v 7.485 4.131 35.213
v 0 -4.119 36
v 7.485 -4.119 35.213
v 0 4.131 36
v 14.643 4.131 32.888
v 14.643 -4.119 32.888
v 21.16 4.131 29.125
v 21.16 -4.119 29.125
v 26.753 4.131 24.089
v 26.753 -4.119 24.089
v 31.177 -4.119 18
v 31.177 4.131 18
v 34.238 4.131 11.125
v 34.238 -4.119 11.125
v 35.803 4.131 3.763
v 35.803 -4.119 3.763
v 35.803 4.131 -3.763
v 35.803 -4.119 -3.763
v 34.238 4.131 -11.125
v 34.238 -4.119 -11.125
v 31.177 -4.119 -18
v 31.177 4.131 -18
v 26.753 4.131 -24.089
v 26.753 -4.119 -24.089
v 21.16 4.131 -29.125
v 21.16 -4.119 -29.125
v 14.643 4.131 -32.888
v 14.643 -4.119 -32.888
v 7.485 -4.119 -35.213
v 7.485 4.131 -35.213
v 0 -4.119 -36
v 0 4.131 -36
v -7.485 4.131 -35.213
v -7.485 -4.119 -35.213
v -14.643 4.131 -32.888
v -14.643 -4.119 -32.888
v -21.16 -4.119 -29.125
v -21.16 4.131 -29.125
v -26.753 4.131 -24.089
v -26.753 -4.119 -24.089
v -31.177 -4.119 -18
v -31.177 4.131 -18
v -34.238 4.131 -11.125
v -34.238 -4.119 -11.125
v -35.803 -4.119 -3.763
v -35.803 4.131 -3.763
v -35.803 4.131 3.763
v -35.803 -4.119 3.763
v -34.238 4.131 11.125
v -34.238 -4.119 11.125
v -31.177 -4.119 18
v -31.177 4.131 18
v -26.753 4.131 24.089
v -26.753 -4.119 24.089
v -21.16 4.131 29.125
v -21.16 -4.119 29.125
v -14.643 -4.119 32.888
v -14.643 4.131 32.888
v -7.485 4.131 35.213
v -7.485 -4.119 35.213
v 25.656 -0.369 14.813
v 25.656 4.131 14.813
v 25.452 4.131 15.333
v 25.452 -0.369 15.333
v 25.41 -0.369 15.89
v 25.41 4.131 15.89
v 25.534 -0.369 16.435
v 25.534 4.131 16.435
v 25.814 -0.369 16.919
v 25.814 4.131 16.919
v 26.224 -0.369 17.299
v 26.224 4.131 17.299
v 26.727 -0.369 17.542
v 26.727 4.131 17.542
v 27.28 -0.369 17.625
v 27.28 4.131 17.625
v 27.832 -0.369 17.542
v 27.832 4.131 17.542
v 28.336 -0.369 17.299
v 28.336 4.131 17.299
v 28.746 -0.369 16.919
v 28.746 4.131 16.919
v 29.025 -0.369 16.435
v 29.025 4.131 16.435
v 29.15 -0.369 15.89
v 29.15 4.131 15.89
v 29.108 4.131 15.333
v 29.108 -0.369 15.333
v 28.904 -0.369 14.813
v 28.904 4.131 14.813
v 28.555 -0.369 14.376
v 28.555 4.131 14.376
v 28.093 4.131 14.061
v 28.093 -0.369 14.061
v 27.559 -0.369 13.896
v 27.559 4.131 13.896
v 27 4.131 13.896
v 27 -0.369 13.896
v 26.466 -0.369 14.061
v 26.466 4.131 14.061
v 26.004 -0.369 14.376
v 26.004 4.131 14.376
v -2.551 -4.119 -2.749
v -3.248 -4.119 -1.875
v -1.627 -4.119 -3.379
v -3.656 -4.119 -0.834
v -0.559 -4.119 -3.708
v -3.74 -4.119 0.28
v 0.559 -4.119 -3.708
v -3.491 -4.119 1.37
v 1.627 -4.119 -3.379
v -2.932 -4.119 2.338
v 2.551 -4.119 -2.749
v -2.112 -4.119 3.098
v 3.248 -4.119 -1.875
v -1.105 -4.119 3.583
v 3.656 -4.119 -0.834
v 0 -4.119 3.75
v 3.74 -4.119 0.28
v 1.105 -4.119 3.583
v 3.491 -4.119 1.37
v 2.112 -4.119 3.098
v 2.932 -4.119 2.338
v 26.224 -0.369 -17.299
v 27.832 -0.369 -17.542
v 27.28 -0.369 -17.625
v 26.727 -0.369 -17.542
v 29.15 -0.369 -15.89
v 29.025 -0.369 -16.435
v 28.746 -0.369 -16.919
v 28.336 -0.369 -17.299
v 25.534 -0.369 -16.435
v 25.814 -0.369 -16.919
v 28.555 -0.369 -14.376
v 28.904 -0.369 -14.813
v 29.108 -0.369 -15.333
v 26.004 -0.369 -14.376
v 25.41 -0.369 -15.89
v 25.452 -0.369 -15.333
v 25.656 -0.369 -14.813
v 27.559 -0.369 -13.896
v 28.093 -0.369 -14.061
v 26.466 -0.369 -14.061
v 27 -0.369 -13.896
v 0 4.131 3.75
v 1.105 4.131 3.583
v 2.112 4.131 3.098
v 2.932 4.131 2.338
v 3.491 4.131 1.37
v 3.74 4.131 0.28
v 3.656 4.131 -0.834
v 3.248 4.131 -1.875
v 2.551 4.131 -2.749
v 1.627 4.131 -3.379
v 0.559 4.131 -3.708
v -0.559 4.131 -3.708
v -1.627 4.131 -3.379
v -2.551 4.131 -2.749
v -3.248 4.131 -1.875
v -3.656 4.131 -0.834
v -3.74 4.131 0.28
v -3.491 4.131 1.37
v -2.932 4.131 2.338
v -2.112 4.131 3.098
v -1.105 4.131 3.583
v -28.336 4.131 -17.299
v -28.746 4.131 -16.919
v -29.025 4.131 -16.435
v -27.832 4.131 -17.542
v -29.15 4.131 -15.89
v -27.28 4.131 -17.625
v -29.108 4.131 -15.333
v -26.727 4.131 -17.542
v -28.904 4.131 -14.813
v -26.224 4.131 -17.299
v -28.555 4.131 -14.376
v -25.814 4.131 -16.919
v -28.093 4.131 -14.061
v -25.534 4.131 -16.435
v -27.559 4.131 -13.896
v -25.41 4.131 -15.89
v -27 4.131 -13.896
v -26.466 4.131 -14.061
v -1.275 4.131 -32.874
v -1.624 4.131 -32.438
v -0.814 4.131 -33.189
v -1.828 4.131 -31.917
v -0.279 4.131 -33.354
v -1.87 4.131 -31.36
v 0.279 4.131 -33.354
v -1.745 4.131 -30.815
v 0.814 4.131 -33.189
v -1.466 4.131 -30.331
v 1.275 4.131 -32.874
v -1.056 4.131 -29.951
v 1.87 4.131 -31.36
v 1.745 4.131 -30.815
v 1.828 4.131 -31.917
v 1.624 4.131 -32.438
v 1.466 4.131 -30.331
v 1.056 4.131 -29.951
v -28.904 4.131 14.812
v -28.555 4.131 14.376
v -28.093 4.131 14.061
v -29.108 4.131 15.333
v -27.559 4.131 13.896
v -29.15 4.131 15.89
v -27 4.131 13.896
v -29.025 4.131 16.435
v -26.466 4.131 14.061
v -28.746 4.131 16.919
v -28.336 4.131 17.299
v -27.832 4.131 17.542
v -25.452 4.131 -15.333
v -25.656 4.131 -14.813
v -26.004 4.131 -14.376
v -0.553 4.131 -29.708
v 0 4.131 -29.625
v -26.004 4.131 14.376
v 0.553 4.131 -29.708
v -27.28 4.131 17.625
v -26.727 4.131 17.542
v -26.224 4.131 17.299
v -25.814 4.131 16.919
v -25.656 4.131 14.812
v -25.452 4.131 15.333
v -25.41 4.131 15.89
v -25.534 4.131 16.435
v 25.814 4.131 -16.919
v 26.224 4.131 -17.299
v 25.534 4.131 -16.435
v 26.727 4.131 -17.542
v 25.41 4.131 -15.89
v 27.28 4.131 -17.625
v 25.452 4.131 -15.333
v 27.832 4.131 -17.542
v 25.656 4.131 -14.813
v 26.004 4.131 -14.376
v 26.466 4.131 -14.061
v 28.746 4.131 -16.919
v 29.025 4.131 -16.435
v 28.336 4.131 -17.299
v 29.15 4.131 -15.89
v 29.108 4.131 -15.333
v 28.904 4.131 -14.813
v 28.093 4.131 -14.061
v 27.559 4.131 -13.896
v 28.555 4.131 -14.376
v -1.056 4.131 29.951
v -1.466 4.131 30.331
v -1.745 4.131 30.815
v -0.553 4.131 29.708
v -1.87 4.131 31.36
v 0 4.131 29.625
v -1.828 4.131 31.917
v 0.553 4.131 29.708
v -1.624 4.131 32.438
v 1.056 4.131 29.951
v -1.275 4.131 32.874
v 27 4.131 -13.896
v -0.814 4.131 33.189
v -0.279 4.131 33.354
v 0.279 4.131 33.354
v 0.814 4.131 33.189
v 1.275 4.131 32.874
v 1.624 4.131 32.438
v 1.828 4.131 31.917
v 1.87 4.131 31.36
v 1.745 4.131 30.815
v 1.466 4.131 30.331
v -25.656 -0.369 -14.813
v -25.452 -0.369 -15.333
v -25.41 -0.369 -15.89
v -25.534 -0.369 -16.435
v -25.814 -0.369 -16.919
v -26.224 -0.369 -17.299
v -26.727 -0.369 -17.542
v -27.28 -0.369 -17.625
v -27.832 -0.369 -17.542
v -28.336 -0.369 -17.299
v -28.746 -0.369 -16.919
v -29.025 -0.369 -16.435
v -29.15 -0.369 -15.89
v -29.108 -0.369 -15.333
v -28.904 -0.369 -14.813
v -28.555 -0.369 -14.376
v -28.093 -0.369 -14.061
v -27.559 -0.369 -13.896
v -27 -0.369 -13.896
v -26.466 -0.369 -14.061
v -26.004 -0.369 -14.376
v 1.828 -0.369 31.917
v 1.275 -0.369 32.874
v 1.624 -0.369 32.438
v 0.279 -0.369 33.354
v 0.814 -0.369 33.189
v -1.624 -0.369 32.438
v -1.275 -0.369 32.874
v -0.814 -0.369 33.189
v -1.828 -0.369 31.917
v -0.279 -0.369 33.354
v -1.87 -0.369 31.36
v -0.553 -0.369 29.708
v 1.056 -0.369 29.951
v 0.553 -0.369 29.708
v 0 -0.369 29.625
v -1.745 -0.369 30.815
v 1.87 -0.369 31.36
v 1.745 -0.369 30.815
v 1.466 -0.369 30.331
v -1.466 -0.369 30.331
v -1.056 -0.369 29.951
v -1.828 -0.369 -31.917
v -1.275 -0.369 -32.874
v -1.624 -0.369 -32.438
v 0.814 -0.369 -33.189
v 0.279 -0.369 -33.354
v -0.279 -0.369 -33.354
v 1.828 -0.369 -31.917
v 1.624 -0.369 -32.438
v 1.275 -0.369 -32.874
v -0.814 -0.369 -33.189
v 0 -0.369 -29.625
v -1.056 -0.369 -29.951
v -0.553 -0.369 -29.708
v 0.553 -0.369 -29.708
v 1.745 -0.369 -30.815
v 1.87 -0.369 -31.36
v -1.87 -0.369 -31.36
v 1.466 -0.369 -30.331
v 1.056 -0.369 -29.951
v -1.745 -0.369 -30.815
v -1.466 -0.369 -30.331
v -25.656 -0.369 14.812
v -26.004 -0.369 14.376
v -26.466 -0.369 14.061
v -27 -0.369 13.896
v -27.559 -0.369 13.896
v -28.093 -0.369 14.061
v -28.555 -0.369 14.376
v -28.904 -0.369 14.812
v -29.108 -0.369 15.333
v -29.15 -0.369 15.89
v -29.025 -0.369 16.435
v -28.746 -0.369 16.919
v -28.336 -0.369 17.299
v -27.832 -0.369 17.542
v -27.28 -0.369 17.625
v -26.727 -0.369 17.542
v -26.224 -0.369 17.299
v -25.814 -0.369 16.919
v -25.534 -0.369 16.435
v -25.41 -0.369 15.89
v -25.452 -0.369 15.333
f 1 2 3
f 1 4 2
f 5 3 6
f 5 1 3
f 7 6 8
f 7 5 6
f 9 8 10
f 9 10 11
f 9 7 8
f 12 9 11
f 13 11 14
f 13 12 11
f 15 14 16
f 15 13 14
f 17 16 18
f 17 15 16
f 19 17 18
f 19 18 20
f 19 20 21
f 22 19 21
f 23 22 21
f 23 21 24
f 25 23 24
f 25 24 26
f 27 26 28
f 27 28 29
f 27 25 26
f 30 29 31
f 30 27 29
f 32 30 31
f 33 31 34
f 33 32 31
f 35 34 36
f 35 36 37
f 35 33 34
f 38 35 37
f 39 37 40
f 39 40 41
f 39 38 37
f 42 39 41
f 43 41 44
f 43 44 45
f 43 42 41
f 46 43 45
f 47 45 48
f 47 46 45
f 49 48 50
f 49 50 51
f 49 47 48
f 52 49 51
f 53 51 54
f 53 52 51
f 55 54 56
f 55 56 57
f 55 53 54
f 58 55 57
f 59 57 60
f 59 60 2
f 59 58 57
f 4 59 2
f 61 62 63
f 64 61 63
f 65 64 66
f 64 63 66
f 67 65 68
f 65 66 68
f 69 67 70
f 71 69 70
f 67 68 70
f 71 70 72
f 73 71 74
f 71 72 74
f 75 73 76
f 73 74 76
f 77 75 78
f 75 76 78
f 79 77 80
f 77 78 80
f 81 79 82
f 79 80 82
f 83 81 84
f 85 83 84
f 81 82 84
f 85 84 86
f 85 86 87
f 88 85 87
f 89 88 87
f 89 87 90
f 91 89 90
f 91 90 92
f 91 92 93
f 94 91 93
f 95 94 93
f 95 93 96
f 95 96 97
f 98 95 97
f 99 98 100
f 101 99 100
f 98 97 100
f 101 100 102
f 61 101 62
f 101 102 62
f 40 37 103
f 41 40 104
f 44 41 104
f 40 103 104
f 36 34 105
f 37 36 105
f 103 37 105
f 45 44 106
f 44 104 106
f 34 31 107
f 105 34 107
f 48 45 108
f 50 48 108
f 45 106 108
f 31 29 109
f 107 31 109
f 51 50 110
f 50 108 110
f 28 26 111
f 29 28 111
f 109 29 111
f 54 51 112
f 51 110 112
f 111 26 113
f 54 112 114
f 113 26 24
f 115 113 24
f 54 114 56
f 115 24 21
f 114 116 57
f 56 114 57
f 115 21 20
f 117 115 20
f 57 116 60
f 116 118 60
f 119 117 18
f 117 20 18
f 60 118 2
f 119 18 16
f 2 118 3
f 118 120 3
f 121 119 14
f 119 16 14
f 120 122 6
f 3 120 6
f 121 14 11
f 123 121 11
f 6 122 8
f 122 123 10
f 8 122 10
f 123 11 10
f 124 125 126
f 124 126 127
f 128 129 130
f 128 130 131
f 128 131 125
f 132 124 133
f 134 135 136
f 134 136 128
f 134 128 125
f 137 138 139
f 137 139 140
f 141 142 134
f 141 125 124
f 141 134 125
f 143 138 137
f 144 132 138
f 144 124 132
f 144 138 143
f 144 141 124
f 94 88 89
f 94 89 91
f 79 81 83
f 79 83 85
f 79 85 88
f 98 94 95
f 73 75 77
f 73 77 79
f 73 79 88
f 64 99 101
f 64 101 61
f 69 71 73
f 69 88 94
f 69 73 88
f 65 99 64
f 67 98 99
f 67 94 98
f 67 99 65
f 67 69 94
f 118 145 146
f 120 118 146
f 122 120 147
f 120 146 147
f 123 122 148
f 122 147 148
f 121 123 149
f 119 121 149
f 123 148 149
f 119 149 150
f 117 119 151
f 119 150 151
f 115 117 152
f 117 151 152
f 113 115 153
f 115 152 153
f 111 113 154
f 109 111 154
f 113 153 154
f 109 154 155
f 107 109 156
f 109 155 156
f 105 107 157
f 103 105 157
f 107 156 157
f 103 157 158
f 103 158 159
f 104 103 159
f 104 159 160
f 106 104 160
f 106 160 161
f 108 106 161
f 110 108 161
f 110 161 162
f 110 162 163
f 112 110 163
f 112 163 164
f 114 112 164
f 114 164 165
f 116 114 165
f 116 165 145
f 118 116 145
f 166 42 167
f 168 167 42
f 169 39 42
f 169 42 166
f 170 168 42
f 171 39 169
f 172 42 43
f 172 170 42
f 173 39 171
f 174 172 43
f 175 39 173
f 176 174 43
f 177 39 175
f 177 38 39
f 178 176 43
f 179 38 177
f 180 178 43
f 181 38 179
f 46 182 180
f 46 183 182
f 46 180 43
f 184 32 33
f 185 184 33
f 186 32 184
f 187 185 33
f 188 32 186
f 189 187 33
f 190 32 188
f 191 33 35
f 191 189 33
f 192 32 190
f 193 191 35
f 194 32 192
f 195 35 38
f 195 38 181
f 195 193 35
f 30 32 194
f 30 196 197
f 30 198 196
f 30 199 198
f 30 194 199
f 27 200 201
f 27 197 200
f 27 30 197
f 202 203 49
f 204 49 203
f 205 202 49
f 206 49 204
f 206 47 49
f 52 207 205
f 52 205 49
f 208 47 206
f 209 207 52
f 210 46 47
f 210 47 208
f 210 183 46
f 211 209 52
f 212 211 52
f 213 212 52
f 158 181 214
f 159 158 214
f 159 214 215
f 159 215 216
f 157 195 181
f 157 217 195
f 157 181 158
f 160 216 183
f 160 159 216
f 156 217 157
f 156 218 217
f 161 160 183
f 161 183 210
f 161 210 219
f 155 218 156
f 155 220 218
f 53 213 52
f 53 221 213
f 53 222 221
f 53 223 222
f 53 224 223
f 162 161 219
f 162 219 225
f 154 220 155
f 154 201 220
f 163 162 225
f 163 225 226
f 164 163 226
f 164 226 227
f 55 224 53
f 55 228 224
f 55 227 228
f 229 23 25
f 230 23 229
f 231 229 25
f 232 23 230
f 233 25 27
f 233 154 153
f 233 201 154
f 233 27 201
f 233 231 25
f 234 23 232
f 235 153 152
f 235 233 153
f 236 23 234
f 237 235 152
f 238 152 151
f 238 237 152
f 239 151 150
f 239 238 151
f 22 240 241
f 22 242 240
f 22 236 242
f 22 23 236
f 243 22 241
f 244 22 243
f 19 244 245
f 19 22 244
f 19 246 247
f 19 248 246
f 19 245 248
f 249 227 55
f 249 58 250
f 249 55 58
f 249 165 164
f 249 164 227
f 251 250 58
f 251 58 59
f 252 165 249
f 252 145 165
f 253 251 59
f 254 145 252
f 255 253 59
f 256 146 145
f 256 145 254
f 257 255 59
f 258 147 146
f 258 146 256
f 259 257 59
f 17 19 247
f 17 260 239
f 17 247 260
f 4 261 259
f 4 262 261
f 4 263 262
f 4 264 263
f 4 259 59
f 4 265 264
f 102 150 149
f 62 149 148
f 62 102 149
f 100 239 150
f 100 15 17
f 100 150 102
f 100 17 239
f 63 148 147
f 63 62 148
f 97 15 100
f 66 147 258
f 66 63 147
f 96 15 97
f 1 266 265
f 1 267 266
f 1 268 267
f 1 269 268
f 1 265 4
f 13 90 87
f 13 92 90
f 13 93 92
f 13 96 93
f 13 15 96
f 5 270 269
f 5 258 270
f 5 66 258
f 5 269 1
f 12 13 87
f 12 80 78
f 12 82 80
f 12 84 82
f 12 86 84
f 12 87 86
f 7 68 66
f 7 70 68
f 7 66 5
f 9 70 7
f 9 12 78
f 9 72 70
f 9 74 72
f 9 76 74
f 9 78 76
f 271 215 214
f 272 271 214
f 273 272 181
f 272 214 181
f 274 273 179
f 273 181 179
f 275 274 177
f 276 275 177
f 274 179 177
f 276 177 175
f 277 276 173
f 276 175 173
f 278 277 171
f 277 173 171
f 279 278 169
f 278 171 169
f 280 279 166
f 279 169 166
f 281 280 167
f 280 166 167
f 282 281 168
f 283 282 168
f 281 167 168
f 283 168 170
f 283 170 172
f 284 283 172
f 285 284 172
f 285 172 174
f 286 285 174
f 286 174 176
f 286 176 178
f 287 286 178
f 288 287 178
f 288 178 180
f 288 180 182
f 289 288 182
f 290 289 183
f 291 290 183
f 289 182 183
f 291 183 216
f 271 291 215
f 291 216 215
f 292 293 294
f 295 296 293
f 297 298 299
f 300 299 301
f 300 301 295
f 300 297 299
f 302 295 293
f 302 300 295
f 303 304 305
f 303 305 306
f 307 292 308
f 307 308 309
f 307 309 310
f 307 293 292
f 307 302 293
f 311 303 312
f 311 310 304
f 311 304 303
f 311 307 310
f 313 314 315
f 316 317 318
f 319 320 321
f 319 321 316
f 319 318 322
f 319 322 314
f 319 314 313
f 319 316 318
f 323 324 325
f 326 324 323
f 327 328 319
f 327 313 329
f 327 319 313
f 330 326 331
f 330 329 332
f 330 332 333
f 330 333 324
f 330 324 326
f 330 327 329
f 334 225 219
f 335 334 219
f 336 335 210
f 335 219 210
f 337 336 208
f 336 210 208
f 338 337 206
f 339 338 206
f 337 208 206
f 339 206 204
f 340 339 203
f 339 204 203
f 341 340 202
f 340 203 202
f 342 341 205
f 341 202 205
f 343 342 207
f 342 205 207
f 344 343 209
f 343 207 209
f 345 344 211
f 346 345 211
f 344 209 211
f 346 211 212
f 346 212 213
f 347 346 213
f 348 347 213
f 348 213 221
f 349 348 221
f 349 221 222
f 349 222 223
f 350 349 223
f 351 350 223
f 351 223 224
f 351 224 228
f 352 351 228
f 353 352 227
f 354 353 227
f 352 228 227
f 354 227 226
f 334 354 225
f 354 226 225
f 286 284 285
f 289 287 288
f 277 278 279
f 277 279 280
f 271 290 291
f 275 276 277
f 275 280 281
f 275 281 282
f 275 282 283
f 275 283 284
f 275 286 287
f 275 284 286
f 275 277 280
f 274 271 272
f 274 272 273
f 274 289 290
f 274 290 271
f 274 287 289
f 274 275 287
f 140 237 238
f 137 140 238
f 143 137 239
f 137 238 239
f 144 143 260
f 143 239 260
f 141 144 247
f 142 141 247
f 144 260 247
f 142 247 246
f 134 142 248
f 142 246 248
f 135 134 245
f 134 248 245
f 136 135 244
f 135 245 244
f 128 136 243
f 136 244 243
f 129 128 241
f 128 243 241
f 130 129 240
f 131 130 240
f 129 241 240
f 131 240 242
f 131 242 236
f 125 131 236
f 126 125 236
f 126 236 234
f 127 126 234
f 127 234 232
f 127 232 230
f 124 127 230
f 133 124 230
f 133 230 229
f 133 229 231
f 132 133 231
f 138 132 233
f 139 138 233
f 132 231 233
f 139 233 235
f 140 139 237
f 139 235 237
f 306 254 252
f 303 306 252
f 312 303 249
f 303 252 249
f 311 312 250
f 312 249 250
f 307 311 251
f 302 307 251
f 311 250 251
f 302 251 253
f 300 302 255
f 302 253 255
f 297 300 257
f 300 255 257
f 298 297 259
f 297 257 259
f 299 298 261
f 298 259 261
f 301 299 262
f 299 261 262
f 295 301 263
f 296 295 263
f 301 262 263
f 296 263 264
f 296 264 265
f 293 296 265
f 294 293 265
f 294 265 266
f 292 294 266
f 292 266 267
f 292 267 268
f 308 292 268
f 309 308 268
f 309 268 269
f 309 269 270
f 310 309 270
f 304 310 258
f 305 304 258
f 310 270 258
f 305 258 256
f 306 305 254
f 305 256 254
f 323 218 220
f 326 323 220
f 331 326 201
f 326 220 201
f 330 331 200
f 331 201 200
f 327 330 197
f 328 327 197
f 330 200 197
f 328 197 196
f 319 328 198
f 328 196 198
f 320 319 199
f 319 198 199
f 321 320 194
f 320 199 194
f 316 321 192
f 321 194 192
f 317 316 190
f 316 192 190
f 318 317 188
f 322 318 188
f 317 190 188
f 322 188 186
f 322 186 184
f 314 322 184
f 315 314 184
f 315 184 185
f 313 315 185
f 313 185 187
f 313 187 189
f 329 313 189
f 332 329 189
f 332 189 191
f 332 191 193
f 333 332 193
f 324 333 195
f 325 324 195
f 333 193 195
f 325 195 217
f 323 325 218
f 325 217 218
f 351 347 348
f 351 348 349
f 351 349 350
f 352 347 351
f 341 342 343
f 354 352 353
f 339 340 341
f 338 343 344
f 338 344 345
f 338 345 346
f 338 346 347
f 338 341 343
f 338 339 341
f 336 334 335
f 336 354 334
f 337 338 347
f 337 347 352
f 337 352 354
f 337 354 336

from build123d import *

# Parameters (mm, degrees)
SKETCH_1_R               = 24
EXTRUDE_1_DEPTH          = 2.75
SKETCH_4_R               = 2.5
CUT_EXTRUDE_1_DEPTH      = 22
SKETCH_6_R               = 1.25
CUT_EXTRUDE_3_DEPTH      = 3
PATTERN_CIRCULAR_1_COUNT = 6
SCALE_1_SCALE            = 1.5


with BuildPart() as part:
    # 草图1 → 凸台-拉伸1 (new, symmetric)
    with BuildSketch(Plane(origin=(0, 0, 0), x_dir=(1, 0, 0), z_dir=(0, 1, 0))):
        with Locations(Location((0, 0, 0), (0, 0, 270))):
            Circle(SKETCH_1_R)
    extrude(amount=EXTRUDE_1_DEPTH, both=True)

    # 草图4 → 切除-拉伸1 (cut)
    with BuildSketch(Plane(origin=(0, 2.75, 0), x_dir=(1, 0, 0), z_dir=(0, 1, 0))):
        with Locations(Location((0, 0, 0), (0, 0, 270))):
            Circle(SKETCH_4_R)
    extrude(amount=-CUT_EXTRUDE_1_DEPTH, mode=Mode.SUBTRACT)

    # 草图6 → 切除-拉伸3 (cut)
    with BuildSketch(Plane(origin=(0, 2.75, 0), x_dir=(1, 0, 0), z_dir=(0, 1, 0))):
        with Locations(Location((0, 21, 0), (0, 0, 270))):
            Circle(SKETCH_6_R)
    cut_extrude_3 = extrude(amount=-CUT_EXTRUDE_3_DEPTH, mode=Mode.SUBTRACT)

    # 阵列(圆周)1: 切除-拉伸3 ×6 about axis
    pattern_circular_1_axis = Axis((0, 0, 0), (0, 1, 0))
    for i in range(1, PATTERN_CIRCULAR_1_COUNT):
        add(cut_extrude_3.rotate(pattern_circular_1_axis, i * 360 / PATTERN_CIRCULAR_1_COUNT), mode=Mode.SUBTRACT)


with BuildPart() as part_1:
    # 缩放比例1: scaled about (0, -0.011320641, 0)
    add(part.part.scale(SCALE_1_SCALE).moved(Location((0, 0.00566032, 0))))


solid = part_1.part
